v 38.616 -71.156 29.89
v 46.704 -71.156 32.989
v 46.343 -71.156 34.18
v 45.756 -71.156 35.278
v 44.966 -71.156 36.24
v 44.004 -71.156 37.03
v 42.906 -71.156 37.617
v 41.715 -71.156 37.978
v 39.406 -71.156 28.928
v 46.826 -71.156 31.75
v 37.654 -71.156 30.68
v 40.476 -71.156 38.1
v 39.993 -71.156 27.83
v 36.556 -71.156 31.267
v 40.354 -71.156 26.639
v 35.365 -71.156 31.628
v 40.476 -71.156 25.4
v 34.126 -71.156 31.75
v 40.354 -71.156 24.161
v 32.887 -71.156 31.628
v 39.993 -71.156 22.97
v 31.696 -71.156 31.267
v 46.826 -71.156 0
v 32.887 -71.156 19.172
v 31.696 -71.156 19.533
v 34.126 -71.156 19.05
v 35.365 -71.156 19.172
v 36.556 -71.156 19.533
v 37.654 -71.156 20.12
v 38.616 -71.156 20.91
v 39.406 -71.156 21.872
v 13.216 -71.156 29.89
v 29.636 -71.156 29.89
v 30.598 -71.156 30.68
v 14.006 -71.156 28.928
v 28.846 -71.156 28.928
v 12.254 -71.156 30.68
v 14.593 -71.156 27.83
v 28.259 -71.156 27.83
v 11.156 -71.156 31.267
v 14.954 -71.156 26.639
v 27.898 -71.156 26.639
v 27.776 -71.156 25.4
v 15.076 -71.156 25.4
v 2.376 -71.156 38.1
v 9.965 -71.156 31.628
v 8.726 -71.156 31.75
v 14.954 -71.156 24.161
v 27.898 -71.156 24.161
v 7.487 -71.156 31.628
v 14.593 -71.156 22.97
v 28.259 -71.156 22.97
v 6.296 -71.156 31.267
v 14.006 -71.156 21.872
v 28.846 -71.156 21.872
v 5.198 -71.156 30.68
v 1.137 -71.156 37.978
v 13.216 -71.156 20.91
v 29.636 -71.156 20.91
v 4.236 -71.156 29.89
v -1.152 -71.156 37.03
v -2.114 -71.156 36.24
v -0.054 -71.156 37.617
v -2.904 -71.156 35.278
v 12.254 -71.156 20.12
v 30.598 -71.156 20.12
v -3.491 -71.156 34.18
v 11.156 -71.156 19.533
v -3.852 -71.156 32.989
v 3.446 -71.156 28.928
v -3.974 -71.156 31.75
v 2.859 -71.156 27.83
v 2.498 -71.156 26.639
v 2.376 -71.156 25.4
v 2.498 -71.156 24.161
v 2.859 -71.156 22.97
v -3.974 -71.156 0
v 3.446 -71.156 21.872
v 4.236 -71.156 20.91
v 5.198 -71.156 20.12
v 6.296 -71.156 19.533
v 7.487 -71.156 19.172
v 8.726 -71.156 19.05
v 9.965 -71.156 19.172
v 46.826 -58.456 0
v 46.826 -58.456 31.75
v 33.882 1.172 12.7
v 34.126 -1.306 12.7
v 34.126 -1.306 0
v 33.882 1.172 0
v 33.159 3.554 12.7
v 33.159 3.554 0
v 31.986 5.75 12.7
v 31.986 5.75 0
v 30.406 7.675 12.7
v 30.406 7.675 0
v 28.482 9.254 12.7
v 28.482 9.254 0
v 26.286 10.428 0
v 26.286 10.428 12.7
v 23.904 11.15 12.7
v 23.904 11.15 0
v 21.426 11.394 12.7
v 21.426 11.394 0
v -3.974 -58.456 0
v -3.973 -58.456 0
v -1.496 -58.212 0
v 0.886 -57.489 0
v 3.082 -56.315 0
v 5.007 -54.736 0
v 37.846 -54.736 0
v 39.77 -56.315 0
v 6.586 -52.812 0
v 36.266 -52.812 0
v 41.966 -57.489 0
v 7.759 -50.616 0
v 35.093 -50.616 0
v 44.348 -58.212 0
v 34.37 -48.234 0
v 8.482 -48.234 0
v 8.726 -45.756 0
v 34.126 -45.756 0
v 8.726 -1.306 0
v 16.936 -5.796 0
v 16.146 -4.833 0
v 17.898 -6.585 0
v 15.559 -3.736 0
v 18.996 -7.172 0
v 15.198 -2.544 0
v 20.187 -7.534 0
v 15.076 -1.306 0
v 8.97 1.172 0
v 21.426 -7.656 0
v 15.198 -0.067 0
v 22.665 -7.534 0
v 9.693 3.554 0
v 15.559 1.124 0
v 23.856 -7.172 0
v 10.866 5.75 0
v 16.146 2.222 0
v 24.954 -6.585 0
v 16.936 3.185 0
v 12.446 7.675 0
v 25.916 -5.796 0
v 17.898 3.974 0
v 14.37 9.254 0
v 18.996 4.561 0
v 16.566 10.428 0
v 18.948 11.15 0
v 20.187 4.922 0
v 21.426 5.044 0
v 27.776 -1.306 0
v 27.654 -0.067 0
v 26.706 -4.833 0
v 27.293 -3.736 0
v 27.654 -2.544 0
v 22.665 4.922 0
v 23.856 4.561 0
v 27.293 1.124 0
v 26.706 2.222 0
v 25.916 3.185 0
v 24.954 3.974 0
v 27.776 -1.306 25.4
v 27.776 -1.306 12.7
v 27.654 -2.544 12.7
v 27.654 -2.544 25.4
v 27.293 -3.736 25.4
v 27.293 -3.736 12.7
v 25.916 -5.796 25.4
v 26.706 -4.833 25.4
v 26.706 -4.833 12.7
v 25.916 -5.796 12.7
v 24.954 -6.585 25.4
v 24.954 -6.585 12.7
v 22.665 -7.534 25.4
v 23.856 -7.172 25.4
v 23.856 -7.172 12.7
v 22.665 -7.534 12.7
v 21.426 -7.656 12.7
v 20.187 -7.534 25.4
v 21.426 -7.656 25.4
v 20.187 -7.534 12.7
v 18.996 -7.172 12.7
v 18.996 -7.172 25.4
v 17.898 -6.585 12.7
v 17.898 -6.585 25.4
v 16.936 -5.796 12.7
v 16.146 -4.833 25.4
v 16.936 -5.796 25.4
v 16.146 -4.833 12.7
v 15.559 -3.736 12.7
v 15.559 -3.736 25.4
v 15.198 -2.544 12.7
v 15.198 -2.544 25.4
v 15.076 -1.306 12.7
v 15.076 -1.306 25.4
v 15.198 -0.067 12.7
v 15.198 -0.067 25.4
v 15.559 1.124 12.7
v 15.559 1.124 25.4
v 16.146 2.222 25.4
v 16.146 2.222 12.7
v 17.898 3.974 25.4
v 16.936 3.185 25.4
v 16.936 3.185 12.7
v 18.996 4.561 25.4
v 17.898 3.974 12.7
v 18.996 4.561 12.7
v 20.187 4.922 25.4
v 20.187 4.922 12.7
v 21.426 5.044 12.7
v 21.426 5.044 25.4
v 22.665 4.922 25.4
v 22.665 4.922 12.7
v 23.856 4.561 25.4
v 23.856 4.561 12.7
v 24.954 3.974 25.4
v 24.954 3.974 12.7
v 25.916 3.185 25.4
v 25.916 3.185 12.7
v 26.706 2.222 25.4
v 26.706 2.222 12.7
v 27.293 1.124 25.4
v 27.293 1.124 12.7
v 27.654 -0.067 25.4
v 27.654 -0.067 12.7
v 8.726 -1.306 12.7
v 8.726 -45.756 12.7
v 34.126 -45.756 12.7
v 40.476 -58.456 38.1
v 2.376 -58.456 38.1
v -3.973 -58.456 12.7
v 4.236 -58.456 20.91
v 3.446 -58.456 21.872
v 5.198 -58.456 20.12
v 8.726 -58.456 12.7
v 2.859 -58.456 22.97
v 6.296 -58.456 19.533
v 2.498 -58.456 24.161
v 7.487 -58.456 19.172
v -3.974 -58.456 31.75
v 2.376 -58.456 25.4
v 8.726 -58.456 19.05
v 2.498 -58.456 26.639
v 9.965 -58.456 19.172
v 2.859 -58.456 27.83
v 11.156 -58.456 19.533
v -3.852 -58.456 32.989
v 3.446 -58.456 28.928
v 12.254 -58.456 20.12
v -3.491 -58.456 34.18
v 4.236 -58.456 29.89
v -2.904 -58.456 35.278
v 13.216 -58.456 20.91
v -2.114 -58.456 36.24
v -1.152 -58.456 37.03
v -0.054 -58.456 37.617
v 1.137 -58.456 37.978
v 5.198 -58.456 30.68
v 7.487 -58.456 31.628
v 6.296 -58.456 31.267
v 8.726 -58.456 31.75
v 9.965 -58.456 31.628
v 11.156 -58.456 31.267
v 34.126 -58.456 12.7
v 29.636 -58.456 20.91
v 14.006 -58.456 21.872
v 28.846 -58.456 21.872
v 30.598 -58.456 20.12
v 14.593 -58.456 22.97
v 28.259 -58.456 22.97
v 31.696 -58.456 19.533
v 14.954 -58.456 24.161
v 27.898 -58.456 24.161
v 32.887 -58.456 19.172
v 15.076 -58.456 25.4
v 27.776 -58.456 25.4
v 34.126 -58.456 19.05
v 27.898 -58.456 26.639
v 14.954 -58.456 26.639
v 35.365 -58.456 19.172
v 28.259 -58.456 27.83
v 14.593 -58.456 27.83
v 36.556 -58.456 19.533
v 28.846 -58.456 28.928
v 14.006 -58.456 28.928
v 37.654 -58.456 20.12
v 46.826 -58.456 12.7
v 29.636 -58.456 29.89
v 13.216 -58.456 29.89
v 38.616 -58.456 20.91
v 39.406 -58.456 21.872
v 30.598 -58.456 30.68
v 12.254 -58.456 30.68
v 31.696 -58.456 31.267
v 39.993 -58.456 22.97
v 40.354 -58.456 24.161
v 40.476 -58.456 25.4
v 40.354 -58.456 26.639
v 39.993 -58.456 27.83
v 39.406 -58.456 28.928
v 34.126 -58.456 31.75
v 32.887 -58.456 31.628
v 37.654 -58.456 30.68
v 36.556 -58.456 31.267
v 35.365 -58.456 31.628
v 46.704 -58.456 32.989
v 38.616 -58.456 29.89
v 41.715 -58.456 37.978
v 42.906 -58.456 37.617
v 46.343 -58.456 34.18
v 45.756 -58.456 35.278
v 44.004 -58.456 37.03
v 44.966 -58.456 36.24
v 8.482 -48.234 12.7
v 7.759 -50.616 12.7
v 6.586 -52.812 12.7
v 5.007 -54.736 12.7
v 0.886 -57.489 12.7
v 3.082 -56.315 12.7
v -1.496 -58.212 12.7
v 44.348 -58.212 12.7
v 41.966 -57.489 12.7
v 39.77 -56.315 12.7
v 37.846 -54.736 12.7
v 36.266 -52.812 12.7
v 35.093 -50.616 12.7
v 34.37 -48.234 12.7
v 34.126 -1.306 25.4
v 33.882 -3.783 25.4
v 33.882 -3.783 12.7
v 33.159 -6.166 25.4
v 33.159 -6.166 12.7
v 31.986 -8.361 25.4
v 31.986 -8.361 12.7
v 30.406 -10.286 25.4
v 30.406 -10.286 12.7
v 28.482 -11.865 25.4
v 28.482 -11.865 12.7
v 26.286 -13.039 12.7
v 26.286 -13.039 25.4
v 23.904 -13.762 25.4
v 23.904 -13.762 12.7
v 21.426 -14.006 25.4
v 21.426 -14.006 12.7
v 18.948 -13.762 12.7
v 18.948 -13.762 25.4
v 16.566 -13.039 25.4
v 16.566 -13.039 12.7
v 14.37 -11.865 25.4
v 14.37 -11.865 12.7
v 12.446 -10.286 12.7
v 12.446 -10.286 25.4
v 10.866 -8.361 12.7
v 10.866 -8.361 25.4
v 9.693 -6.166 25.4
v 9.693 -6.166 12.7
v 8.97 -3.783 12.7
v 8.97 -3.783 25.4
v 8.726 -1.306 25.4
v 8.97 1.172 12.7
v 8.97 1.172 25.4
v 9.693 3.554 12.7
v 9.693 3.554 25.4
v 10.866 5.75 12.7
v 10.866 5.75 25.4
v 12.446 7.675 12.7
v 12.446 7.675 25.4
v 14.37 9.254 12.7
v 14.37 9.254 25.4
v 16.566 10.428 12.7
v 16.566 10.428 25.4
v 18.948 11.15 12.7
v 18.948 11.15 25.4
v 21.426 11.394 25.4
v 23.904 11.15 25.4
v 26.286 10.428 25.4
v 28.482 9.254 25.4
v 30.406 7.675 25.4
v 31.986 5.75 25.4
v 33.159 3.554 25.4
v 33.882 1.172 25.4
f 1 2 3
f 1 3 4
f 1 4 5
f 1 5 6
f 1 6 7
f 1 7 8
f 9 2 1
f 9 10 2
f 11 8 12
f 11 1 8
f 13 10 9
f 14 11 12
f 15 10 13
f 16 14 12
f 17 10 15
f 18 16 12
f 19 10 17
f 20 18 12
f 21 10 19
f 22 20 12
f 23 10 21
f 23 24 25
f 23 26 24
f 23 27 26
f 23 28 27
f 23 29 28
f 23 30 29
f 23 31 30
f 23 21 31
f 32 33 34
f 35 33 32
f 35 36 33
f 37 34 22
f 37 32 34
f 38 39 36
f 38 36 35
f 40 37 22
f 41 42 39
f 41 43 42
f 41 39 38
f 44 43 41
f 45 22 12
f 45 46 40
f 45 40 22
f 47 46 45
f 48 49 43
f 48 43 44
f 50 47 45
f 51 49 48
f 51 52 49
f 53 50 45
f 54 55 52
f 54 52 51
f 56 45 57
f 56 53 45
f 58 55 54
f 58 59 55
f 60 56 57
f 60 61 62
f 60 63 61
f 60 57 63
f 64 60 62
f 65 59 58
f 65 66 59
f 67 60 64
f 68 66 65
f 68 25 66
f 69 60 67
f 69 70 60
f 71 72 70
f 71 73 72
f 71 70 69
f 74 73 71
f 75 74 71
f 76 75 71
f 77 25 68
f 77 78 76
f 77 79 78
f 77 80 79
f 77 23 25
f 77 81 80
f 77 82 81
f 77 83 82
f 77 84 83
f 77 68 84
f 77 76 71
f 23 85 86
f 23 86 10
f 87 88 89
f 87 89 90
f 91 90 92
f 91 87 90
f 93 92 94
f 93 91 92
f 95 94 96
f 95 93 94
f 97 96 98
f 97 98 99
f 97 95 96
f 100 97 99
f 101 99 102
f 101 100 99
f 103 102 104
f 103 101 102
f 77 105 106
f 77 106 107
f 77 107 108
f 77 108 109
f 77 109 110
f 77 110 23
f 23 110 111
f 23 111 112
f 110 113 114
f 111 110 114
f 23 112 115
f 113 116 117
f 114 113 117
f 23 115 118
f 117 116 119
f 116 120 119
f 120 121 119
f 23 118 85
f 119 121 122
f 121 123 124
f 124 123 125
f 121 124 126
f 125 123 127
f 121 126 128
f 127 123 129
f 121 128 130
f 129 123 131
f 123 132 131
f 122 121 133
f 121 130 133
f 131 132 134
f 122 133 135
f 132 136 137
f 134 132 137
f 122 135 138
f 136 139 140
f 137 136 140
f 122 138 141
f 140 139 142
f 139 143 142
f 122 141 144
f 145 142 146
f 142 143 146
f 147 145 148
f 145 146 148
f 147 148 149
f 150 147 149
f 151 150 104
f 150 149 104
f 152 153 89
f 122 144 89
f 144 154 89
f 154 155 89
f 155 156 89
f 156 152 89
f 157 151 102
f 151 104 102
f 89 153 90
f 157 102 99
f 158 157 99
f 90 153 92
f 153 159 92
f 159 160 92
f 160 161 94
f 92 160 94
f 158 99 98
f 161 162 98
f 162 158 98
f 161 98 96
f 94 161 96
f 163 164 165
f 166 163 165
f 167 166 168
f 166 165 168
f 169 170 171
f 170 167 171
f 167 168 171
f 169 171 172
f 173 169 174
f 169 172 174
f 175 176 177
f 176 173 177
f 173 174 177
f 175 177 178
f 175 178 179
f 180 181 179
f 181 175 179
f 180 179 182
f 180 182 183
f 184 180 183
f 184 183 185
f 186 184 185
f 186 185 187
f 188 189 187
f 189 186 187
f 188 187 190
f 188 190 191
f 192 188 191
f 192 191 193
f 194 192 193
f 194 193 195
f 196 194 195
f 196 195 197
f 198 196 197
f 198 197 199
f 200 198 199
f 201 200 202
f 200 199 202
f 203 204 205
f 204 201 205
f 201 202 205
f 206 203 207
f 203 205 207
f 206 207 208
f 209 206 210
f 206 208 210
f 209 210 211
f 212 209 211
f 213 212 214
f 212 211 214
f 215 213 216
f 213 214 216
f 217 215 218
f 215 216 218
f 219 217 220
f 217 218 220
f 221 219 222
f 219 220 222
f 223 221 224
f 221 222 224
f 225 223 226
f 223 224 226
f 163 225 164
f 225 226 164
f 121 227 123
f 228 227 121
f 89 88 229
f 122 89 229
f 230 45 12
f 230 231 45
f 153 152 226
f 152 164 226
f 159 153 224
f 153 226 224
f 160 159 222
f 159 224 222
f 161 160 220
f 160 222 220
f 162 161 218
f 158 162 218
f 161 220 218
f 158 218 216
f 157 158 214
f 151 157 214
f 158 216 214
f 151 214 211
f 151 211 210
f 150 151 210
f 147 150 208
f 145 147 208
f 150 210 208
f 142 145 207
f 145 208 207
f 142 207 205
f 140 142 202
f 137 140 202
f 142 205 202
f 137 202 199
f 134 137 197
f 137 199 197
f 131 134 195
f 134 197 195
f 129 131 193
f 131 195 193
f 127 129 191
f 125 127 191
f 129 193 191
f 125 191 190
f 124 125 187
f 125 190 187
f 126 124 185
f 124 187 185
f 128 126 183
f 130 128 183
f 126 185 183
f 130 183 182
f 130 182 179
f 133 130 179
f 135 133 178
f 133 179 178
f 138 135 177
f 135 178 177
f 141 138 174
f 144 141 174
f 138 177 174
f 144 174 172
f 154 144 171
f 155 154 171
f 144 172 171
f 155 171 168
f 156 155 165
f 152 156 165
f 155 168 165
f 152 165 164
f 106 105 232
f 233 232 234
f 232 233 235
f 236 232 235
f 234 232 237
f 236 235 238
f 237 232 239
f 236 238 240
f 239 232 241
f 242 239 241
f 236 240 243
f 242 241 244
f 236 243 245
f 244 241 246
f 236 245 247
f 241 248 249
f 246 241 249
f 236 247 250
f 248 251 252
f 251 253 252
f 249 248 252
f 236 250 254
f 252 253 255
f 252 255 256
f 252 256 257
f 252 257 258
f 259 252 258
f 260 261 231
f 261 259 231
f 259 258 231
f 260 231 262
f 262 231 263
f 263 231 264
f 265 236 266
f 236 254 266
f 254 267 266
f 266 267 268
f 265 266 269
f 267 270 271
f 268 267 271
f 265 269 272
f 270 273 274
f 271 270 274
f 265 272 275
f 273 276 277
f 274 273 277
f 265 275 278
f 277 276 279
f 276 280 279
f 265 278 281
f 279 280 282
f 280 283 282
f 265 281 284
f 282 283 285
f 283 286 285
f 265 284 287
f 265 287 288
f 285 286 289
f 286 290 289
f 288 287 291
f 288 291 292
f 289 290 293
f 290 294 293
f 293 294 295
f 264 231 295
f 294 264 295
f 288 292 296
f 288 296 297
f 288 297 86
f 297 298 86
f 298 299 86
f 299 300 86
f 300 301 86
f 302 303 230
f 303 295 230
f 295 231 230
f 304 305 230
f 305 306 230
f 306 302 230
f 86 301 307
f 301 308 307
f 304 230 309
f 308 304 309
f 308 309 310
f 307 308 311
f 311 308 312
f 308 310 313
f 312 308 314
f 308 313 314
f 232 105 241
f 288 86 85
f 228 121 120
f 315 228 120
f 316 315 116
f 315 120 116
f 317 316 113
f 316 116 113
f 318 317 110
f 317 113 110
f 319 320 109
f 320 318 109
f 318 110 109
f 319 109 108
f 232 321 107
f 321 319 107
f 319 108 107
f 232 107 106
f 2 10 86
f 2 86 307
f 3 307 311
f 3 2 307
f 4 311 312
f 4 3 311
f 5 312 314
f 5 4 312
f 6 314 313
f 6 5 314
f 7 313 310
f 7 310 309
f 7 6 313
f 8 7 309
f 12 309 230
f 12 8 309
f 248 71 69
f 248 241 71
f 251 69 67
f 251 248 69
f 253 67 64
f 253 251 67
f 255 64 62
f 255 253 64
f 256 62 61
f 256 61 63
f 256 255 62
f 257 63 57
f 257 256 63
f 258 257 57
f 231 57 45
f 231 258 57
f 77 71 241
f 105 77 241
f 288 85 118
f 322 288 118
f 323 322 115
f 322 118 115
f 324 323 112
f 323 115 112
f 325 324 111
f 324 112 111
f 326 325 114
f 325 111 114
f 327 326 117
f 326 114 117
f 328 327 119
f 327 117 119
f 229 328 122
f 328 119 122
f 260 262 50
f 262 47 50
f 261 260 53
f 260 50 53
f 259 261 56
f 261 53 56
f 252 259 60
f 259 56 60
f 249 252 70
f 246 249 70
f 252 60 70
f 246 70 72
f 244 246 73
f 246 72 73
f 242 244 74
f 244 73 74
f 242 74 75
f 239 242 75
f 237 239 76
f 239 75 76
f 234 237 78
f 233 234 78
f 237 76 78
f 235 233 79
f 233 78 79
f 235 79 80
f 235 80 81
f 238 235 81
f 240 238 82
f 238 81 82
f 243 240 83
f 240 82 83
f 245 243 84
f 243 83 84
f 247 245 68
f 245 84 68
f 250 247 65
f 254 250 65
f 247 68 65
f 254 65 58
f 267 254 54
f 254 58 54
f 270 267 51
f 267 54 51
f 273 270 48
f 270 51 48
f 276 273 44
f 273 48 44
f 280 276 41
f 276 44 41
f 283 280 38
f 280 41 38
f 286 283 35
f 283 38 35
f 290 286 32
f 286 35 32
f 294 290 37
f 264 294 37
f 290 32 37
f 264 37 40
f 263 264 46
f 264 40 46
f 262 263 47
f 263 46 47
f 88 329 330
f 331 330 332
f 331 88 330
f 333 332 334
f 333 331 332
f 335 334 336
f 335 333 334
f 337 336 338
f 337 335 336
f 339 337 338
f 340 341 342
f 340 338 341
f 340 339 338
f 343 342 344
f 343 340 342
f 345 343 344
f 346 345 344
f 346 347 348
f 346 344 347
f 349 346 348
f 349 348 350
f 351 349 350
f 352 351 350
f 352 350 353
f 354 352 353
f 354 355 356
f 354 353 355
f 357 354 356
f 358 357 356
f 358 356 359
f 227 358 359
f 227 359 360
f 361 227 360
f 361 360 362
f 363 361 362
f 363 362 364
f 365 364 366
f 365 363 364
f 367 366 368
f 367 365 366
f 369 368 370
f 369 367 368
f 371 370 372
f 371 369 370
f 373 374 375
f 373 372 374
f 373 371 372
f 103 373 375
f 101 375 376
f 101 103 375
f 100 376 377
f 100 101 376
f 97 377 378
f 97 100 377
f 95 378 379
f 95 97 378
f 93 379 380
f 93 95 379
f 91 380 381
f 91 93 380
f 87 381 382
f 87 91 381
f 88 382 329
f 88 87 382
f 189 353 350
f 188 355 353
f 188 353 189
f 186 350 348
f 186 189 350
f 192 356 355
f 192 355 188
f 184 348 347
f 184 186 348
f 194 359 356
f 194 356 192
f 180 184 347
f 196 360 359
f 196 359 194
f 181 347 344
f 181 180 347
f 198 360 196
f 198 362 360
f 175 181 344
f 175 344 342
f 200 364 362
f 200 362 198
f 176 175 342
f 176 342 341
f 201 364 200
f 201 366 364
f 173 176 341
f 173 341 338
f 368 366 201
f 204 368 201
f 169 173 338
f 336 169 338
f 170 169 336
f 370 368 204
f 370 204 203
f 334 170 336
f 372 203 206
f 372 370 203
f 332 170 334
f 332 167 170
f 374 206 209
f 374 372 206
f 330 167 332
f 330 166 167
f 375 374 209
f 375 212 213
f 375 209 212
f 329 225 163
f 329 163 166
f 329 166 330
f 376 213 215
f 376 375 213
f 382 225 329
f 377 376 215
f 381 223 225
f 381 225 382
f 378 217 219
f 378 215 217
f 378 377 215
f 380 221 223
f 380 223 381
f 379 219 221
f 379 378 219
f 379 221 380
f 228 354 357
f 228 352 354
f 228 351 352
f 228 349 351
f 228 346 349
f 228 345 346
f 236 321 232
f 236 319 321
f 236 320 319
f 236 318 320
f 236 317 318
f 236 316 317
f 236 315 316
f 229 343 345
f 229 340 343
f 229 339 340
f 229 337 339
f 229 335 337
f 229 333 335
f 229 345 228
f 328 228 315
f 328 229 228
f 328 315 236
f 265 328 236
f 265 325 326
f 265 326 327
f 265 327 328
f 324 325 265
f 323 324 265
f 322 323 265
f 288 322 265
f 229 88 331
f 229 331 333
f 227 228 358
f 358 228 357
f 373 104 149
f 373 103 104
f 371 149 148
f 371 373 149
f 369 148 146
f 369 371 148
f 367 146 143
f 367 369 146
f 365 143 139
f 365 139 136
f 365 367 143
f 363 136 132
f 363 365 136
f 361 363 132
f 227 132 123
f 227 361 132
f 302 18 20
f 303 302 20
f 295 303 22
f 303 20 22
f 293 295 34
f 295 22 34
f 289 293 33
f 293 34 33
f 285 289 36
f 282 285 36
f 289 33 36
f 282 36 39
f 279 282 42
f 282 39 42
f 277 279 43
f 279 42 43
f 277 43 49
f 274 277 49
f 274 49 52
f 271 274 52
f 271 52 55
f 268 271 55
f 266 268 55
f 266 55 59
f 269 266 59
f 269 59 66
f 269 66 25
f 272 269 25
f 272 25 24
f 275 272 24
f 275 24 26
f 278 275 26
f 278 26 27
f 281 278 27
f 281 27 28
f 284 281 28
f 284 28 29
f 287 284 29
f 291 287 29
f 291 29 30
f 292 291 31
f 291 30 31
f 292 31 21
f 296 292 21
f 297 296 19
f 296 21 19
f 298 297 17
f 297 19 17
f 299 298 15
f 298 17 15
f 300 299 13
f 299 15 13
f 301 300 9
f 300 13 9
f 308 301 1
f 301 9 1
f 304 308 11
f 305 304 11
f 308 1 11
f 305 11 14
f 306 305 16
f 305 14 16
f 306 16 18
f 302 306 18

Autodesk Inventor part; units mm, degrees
ref_plane "YZ Plane" through (0, 0, 0) normal (1, 0, 0) x (0, 1, 0)
ref_plane "XZ Plane" through (0, 0, 0) normal (0, 1, 0) x (-1, 0, 0)
ref_plane "XY Plane" through (0, 0, 0) normal (0, 0, 1) x (1, 0, 0)
sketch "Sketch1" plane through (0, 0, 0) normal (0, 0, 1) x (1, 0, 0)
  line L0 (-3.9739, 11.3944) -> (46.8261, 11.3944)
  line L1 (46.8261, 11.3944) -> (46.8261, -71.1556)
  line L2 (46.8261, -71.1556) -> (-3.9739, -71.1556)
  line L3 (-3.9739, -71.1556) -> (-3.9739, 11.3944)
  point P0 (0, 0)
  dimension "d0" = 50.8
  dimension "d1" = 82.55
extrude "Extrusion1" add sketch "Sketch1" along normal blind 38.1
sketch "Sketch2" plane through (46.8261, -71.1556, 0) normal (1, 0, 0) x (0, 0, -1)
  line L0 (0, 82.55) -> (-38.1, 82.55) projected
  line L1 (-38.1, 82.55) -> (-12.7, 82.55)
  line L2 (-12.7, 82.55) -> (-12.7, 12.7)
  line L3 (-12.7, 12.7) -> (-38.1, 12.7)
  line L4 (-38.1, 12.7) -> (-38.1, 82.55)
  point P0 (0, 71.1556)
  dimension "d4" = 25.4
  dimension "d5" = 69.85
extrude "Extrusion2" cut sketch "Sketch2" against normal through all
sketch "Sketch3" plane through (46.8261, -58.4556, 12.7) normal (0, 0, 1) x (1, 0, 0)
  line L0 (-50.8, 69.85) -> (0, 69.85) projected
  line L1 (-50.8, 69.85) -> (-38.1, 69.85)
  line L2 (-38.1, 69.85) -> (-38.1, 0)
  line L3 (-38.1, 0) -> (-50.8, 0)
  line L4 (-50.8, 0) -> (-50.8, 69.85)
  line L5 (0, 69.85) -> (-12.7, 69.85)
  line L6 (-12.7, 69.85) -> (-12.7, 0)
  line L7 (-12.7, 0) -> (0, 0)
  line L8 (0, 0) -> (0, 69.85)
  point P0 (-46.8261, 58.4556)
  dimension "d8" = 12.7
  dimension "d9" = 69.85
  dimension "d10" = 12.7
  dimension "d11" = 69.85
extrude "Extrusion3" cut sketch "Sketch3" against normal through all
sketch "Sketch4" plane through (8.7261, -58.4556, 12.7) normal (0, 0, 1) x (1, 0, 0)
  line L0 (0, 69.85) -> (0, 0) construction
  line L1 (25.4, 0) -> (0, 0) construction
  line L2 (25.4, 0) -> (25.4, 69.85) construction
  line L3 (0, 69.85) -> (25.4, 69.85) construction
  circle A0 centre (12.7, 57.15) radius 12.7
  circle A1 centre (12.7, 57.15) radius 6.35
  point P0 (-8.7261, 58.4556)
  dimension "d14" = 12.7
extrude "Extrusion4" add sketch "Sketch4" along normal mid plane 25.4
sketch "Sketch5" plane through (8.7261, 11.3944, 12.7) normal (0, 0, 1) x (1, 0, 0)
  arc A0 (12.7, 0) -> (0, -12.7) centre (12.7, -12.7) ccw projected
  line L0 (0, 0) -> (12.7, 0) projected
  line L1 (0, 0) -> (0, -12.7) projected
  arc A1 (25.4, -12.7) -> (12.7, 0) centre (12.7, -12.7) ccw projected
  line L2 (25.4, -12.7) -> (25.4, 0) projected
  line L3 (12.7, 0) -> (25.4, 0) projected
  point P0 (-8.7261, -11.3944)
extrude "Extrusion5" cut sketch "Sketch5" against normal through all
sketch "Sketch6" plane through (21.4261, -1.3056, 12.7) normal (0, 0, 1) x (1, 0, 0)
  circle A0 centre (0, 0) radius 6.35 projected
  point P0 (-21.4261, 1.3056)
extrude "Extrusion6" cut sketch "Sketch6" against normal through all
sketch "Sketch7" plane through (46.8261, -58.4556, 38.1) normal (0, 1, 0) x (1, 0, 0)
  line L0 (-50.8, 0) -> (-50.8, 38.1) construction
  line L1 (0, 0) -> (-50.8, 0) construction
  line L2 (0, 38.1) -> (0, 0) construction
  line L3 (-12.7, 38.1) -> (0, 38.1) construction
  line L4 (-12.7, 25.4) -> (-12.7, 38.1) construction
  line L5 (-12.7, 25.4) -> (-38.1, 25.4) construction
  line L6 (-38.1, 25.4) -> (-38.1, 38.1) construction
  line L7 (-50.8, 38.1) -> (-38.1, 38.1) construction
  line L8 (-50.8, 0) -> (-50.8, 38.1) construction
  line L9 (0, 0) -> (-50.8, 0) construction
  line L10 (0, 38.1) -> (0, 0) construction
  line L11 (-12.7, 38.1) -> (0, 38.1) construction
  line L12 (-12.7, 25.4) -> (-12.7, 38.1) construction
  line L13 (-12.7, 25.4) -> (-38.1, 25.4) construction
  line L14 (-38.1, 25.4) -> (-38.1, 38.1) construction
  line L15 (-50.8, 38.1) -> (-38.1, 38.1) construction
  line L16 (-38.1, 12.7) -> (-12.7, 12.7) construction
  point P0 (-46.8261, 38.1)
hole "Hole1" at (8.7261, -58.4556, 25.4) at (34.1261, -58.4556, 25.4) direction (0, -1, 0) diameter 12.7 end through all
fillet "Fillet1" radius 6.35 2 edges at (-3.9739, -64.8056, 38.1) (46.8261, -64.8056, 38.1)
fillet "Fillet2" radius 12.7 2 edges at (8.7261, -58.4556, 6.35) (34.1261, -58.4556, 6.35)
